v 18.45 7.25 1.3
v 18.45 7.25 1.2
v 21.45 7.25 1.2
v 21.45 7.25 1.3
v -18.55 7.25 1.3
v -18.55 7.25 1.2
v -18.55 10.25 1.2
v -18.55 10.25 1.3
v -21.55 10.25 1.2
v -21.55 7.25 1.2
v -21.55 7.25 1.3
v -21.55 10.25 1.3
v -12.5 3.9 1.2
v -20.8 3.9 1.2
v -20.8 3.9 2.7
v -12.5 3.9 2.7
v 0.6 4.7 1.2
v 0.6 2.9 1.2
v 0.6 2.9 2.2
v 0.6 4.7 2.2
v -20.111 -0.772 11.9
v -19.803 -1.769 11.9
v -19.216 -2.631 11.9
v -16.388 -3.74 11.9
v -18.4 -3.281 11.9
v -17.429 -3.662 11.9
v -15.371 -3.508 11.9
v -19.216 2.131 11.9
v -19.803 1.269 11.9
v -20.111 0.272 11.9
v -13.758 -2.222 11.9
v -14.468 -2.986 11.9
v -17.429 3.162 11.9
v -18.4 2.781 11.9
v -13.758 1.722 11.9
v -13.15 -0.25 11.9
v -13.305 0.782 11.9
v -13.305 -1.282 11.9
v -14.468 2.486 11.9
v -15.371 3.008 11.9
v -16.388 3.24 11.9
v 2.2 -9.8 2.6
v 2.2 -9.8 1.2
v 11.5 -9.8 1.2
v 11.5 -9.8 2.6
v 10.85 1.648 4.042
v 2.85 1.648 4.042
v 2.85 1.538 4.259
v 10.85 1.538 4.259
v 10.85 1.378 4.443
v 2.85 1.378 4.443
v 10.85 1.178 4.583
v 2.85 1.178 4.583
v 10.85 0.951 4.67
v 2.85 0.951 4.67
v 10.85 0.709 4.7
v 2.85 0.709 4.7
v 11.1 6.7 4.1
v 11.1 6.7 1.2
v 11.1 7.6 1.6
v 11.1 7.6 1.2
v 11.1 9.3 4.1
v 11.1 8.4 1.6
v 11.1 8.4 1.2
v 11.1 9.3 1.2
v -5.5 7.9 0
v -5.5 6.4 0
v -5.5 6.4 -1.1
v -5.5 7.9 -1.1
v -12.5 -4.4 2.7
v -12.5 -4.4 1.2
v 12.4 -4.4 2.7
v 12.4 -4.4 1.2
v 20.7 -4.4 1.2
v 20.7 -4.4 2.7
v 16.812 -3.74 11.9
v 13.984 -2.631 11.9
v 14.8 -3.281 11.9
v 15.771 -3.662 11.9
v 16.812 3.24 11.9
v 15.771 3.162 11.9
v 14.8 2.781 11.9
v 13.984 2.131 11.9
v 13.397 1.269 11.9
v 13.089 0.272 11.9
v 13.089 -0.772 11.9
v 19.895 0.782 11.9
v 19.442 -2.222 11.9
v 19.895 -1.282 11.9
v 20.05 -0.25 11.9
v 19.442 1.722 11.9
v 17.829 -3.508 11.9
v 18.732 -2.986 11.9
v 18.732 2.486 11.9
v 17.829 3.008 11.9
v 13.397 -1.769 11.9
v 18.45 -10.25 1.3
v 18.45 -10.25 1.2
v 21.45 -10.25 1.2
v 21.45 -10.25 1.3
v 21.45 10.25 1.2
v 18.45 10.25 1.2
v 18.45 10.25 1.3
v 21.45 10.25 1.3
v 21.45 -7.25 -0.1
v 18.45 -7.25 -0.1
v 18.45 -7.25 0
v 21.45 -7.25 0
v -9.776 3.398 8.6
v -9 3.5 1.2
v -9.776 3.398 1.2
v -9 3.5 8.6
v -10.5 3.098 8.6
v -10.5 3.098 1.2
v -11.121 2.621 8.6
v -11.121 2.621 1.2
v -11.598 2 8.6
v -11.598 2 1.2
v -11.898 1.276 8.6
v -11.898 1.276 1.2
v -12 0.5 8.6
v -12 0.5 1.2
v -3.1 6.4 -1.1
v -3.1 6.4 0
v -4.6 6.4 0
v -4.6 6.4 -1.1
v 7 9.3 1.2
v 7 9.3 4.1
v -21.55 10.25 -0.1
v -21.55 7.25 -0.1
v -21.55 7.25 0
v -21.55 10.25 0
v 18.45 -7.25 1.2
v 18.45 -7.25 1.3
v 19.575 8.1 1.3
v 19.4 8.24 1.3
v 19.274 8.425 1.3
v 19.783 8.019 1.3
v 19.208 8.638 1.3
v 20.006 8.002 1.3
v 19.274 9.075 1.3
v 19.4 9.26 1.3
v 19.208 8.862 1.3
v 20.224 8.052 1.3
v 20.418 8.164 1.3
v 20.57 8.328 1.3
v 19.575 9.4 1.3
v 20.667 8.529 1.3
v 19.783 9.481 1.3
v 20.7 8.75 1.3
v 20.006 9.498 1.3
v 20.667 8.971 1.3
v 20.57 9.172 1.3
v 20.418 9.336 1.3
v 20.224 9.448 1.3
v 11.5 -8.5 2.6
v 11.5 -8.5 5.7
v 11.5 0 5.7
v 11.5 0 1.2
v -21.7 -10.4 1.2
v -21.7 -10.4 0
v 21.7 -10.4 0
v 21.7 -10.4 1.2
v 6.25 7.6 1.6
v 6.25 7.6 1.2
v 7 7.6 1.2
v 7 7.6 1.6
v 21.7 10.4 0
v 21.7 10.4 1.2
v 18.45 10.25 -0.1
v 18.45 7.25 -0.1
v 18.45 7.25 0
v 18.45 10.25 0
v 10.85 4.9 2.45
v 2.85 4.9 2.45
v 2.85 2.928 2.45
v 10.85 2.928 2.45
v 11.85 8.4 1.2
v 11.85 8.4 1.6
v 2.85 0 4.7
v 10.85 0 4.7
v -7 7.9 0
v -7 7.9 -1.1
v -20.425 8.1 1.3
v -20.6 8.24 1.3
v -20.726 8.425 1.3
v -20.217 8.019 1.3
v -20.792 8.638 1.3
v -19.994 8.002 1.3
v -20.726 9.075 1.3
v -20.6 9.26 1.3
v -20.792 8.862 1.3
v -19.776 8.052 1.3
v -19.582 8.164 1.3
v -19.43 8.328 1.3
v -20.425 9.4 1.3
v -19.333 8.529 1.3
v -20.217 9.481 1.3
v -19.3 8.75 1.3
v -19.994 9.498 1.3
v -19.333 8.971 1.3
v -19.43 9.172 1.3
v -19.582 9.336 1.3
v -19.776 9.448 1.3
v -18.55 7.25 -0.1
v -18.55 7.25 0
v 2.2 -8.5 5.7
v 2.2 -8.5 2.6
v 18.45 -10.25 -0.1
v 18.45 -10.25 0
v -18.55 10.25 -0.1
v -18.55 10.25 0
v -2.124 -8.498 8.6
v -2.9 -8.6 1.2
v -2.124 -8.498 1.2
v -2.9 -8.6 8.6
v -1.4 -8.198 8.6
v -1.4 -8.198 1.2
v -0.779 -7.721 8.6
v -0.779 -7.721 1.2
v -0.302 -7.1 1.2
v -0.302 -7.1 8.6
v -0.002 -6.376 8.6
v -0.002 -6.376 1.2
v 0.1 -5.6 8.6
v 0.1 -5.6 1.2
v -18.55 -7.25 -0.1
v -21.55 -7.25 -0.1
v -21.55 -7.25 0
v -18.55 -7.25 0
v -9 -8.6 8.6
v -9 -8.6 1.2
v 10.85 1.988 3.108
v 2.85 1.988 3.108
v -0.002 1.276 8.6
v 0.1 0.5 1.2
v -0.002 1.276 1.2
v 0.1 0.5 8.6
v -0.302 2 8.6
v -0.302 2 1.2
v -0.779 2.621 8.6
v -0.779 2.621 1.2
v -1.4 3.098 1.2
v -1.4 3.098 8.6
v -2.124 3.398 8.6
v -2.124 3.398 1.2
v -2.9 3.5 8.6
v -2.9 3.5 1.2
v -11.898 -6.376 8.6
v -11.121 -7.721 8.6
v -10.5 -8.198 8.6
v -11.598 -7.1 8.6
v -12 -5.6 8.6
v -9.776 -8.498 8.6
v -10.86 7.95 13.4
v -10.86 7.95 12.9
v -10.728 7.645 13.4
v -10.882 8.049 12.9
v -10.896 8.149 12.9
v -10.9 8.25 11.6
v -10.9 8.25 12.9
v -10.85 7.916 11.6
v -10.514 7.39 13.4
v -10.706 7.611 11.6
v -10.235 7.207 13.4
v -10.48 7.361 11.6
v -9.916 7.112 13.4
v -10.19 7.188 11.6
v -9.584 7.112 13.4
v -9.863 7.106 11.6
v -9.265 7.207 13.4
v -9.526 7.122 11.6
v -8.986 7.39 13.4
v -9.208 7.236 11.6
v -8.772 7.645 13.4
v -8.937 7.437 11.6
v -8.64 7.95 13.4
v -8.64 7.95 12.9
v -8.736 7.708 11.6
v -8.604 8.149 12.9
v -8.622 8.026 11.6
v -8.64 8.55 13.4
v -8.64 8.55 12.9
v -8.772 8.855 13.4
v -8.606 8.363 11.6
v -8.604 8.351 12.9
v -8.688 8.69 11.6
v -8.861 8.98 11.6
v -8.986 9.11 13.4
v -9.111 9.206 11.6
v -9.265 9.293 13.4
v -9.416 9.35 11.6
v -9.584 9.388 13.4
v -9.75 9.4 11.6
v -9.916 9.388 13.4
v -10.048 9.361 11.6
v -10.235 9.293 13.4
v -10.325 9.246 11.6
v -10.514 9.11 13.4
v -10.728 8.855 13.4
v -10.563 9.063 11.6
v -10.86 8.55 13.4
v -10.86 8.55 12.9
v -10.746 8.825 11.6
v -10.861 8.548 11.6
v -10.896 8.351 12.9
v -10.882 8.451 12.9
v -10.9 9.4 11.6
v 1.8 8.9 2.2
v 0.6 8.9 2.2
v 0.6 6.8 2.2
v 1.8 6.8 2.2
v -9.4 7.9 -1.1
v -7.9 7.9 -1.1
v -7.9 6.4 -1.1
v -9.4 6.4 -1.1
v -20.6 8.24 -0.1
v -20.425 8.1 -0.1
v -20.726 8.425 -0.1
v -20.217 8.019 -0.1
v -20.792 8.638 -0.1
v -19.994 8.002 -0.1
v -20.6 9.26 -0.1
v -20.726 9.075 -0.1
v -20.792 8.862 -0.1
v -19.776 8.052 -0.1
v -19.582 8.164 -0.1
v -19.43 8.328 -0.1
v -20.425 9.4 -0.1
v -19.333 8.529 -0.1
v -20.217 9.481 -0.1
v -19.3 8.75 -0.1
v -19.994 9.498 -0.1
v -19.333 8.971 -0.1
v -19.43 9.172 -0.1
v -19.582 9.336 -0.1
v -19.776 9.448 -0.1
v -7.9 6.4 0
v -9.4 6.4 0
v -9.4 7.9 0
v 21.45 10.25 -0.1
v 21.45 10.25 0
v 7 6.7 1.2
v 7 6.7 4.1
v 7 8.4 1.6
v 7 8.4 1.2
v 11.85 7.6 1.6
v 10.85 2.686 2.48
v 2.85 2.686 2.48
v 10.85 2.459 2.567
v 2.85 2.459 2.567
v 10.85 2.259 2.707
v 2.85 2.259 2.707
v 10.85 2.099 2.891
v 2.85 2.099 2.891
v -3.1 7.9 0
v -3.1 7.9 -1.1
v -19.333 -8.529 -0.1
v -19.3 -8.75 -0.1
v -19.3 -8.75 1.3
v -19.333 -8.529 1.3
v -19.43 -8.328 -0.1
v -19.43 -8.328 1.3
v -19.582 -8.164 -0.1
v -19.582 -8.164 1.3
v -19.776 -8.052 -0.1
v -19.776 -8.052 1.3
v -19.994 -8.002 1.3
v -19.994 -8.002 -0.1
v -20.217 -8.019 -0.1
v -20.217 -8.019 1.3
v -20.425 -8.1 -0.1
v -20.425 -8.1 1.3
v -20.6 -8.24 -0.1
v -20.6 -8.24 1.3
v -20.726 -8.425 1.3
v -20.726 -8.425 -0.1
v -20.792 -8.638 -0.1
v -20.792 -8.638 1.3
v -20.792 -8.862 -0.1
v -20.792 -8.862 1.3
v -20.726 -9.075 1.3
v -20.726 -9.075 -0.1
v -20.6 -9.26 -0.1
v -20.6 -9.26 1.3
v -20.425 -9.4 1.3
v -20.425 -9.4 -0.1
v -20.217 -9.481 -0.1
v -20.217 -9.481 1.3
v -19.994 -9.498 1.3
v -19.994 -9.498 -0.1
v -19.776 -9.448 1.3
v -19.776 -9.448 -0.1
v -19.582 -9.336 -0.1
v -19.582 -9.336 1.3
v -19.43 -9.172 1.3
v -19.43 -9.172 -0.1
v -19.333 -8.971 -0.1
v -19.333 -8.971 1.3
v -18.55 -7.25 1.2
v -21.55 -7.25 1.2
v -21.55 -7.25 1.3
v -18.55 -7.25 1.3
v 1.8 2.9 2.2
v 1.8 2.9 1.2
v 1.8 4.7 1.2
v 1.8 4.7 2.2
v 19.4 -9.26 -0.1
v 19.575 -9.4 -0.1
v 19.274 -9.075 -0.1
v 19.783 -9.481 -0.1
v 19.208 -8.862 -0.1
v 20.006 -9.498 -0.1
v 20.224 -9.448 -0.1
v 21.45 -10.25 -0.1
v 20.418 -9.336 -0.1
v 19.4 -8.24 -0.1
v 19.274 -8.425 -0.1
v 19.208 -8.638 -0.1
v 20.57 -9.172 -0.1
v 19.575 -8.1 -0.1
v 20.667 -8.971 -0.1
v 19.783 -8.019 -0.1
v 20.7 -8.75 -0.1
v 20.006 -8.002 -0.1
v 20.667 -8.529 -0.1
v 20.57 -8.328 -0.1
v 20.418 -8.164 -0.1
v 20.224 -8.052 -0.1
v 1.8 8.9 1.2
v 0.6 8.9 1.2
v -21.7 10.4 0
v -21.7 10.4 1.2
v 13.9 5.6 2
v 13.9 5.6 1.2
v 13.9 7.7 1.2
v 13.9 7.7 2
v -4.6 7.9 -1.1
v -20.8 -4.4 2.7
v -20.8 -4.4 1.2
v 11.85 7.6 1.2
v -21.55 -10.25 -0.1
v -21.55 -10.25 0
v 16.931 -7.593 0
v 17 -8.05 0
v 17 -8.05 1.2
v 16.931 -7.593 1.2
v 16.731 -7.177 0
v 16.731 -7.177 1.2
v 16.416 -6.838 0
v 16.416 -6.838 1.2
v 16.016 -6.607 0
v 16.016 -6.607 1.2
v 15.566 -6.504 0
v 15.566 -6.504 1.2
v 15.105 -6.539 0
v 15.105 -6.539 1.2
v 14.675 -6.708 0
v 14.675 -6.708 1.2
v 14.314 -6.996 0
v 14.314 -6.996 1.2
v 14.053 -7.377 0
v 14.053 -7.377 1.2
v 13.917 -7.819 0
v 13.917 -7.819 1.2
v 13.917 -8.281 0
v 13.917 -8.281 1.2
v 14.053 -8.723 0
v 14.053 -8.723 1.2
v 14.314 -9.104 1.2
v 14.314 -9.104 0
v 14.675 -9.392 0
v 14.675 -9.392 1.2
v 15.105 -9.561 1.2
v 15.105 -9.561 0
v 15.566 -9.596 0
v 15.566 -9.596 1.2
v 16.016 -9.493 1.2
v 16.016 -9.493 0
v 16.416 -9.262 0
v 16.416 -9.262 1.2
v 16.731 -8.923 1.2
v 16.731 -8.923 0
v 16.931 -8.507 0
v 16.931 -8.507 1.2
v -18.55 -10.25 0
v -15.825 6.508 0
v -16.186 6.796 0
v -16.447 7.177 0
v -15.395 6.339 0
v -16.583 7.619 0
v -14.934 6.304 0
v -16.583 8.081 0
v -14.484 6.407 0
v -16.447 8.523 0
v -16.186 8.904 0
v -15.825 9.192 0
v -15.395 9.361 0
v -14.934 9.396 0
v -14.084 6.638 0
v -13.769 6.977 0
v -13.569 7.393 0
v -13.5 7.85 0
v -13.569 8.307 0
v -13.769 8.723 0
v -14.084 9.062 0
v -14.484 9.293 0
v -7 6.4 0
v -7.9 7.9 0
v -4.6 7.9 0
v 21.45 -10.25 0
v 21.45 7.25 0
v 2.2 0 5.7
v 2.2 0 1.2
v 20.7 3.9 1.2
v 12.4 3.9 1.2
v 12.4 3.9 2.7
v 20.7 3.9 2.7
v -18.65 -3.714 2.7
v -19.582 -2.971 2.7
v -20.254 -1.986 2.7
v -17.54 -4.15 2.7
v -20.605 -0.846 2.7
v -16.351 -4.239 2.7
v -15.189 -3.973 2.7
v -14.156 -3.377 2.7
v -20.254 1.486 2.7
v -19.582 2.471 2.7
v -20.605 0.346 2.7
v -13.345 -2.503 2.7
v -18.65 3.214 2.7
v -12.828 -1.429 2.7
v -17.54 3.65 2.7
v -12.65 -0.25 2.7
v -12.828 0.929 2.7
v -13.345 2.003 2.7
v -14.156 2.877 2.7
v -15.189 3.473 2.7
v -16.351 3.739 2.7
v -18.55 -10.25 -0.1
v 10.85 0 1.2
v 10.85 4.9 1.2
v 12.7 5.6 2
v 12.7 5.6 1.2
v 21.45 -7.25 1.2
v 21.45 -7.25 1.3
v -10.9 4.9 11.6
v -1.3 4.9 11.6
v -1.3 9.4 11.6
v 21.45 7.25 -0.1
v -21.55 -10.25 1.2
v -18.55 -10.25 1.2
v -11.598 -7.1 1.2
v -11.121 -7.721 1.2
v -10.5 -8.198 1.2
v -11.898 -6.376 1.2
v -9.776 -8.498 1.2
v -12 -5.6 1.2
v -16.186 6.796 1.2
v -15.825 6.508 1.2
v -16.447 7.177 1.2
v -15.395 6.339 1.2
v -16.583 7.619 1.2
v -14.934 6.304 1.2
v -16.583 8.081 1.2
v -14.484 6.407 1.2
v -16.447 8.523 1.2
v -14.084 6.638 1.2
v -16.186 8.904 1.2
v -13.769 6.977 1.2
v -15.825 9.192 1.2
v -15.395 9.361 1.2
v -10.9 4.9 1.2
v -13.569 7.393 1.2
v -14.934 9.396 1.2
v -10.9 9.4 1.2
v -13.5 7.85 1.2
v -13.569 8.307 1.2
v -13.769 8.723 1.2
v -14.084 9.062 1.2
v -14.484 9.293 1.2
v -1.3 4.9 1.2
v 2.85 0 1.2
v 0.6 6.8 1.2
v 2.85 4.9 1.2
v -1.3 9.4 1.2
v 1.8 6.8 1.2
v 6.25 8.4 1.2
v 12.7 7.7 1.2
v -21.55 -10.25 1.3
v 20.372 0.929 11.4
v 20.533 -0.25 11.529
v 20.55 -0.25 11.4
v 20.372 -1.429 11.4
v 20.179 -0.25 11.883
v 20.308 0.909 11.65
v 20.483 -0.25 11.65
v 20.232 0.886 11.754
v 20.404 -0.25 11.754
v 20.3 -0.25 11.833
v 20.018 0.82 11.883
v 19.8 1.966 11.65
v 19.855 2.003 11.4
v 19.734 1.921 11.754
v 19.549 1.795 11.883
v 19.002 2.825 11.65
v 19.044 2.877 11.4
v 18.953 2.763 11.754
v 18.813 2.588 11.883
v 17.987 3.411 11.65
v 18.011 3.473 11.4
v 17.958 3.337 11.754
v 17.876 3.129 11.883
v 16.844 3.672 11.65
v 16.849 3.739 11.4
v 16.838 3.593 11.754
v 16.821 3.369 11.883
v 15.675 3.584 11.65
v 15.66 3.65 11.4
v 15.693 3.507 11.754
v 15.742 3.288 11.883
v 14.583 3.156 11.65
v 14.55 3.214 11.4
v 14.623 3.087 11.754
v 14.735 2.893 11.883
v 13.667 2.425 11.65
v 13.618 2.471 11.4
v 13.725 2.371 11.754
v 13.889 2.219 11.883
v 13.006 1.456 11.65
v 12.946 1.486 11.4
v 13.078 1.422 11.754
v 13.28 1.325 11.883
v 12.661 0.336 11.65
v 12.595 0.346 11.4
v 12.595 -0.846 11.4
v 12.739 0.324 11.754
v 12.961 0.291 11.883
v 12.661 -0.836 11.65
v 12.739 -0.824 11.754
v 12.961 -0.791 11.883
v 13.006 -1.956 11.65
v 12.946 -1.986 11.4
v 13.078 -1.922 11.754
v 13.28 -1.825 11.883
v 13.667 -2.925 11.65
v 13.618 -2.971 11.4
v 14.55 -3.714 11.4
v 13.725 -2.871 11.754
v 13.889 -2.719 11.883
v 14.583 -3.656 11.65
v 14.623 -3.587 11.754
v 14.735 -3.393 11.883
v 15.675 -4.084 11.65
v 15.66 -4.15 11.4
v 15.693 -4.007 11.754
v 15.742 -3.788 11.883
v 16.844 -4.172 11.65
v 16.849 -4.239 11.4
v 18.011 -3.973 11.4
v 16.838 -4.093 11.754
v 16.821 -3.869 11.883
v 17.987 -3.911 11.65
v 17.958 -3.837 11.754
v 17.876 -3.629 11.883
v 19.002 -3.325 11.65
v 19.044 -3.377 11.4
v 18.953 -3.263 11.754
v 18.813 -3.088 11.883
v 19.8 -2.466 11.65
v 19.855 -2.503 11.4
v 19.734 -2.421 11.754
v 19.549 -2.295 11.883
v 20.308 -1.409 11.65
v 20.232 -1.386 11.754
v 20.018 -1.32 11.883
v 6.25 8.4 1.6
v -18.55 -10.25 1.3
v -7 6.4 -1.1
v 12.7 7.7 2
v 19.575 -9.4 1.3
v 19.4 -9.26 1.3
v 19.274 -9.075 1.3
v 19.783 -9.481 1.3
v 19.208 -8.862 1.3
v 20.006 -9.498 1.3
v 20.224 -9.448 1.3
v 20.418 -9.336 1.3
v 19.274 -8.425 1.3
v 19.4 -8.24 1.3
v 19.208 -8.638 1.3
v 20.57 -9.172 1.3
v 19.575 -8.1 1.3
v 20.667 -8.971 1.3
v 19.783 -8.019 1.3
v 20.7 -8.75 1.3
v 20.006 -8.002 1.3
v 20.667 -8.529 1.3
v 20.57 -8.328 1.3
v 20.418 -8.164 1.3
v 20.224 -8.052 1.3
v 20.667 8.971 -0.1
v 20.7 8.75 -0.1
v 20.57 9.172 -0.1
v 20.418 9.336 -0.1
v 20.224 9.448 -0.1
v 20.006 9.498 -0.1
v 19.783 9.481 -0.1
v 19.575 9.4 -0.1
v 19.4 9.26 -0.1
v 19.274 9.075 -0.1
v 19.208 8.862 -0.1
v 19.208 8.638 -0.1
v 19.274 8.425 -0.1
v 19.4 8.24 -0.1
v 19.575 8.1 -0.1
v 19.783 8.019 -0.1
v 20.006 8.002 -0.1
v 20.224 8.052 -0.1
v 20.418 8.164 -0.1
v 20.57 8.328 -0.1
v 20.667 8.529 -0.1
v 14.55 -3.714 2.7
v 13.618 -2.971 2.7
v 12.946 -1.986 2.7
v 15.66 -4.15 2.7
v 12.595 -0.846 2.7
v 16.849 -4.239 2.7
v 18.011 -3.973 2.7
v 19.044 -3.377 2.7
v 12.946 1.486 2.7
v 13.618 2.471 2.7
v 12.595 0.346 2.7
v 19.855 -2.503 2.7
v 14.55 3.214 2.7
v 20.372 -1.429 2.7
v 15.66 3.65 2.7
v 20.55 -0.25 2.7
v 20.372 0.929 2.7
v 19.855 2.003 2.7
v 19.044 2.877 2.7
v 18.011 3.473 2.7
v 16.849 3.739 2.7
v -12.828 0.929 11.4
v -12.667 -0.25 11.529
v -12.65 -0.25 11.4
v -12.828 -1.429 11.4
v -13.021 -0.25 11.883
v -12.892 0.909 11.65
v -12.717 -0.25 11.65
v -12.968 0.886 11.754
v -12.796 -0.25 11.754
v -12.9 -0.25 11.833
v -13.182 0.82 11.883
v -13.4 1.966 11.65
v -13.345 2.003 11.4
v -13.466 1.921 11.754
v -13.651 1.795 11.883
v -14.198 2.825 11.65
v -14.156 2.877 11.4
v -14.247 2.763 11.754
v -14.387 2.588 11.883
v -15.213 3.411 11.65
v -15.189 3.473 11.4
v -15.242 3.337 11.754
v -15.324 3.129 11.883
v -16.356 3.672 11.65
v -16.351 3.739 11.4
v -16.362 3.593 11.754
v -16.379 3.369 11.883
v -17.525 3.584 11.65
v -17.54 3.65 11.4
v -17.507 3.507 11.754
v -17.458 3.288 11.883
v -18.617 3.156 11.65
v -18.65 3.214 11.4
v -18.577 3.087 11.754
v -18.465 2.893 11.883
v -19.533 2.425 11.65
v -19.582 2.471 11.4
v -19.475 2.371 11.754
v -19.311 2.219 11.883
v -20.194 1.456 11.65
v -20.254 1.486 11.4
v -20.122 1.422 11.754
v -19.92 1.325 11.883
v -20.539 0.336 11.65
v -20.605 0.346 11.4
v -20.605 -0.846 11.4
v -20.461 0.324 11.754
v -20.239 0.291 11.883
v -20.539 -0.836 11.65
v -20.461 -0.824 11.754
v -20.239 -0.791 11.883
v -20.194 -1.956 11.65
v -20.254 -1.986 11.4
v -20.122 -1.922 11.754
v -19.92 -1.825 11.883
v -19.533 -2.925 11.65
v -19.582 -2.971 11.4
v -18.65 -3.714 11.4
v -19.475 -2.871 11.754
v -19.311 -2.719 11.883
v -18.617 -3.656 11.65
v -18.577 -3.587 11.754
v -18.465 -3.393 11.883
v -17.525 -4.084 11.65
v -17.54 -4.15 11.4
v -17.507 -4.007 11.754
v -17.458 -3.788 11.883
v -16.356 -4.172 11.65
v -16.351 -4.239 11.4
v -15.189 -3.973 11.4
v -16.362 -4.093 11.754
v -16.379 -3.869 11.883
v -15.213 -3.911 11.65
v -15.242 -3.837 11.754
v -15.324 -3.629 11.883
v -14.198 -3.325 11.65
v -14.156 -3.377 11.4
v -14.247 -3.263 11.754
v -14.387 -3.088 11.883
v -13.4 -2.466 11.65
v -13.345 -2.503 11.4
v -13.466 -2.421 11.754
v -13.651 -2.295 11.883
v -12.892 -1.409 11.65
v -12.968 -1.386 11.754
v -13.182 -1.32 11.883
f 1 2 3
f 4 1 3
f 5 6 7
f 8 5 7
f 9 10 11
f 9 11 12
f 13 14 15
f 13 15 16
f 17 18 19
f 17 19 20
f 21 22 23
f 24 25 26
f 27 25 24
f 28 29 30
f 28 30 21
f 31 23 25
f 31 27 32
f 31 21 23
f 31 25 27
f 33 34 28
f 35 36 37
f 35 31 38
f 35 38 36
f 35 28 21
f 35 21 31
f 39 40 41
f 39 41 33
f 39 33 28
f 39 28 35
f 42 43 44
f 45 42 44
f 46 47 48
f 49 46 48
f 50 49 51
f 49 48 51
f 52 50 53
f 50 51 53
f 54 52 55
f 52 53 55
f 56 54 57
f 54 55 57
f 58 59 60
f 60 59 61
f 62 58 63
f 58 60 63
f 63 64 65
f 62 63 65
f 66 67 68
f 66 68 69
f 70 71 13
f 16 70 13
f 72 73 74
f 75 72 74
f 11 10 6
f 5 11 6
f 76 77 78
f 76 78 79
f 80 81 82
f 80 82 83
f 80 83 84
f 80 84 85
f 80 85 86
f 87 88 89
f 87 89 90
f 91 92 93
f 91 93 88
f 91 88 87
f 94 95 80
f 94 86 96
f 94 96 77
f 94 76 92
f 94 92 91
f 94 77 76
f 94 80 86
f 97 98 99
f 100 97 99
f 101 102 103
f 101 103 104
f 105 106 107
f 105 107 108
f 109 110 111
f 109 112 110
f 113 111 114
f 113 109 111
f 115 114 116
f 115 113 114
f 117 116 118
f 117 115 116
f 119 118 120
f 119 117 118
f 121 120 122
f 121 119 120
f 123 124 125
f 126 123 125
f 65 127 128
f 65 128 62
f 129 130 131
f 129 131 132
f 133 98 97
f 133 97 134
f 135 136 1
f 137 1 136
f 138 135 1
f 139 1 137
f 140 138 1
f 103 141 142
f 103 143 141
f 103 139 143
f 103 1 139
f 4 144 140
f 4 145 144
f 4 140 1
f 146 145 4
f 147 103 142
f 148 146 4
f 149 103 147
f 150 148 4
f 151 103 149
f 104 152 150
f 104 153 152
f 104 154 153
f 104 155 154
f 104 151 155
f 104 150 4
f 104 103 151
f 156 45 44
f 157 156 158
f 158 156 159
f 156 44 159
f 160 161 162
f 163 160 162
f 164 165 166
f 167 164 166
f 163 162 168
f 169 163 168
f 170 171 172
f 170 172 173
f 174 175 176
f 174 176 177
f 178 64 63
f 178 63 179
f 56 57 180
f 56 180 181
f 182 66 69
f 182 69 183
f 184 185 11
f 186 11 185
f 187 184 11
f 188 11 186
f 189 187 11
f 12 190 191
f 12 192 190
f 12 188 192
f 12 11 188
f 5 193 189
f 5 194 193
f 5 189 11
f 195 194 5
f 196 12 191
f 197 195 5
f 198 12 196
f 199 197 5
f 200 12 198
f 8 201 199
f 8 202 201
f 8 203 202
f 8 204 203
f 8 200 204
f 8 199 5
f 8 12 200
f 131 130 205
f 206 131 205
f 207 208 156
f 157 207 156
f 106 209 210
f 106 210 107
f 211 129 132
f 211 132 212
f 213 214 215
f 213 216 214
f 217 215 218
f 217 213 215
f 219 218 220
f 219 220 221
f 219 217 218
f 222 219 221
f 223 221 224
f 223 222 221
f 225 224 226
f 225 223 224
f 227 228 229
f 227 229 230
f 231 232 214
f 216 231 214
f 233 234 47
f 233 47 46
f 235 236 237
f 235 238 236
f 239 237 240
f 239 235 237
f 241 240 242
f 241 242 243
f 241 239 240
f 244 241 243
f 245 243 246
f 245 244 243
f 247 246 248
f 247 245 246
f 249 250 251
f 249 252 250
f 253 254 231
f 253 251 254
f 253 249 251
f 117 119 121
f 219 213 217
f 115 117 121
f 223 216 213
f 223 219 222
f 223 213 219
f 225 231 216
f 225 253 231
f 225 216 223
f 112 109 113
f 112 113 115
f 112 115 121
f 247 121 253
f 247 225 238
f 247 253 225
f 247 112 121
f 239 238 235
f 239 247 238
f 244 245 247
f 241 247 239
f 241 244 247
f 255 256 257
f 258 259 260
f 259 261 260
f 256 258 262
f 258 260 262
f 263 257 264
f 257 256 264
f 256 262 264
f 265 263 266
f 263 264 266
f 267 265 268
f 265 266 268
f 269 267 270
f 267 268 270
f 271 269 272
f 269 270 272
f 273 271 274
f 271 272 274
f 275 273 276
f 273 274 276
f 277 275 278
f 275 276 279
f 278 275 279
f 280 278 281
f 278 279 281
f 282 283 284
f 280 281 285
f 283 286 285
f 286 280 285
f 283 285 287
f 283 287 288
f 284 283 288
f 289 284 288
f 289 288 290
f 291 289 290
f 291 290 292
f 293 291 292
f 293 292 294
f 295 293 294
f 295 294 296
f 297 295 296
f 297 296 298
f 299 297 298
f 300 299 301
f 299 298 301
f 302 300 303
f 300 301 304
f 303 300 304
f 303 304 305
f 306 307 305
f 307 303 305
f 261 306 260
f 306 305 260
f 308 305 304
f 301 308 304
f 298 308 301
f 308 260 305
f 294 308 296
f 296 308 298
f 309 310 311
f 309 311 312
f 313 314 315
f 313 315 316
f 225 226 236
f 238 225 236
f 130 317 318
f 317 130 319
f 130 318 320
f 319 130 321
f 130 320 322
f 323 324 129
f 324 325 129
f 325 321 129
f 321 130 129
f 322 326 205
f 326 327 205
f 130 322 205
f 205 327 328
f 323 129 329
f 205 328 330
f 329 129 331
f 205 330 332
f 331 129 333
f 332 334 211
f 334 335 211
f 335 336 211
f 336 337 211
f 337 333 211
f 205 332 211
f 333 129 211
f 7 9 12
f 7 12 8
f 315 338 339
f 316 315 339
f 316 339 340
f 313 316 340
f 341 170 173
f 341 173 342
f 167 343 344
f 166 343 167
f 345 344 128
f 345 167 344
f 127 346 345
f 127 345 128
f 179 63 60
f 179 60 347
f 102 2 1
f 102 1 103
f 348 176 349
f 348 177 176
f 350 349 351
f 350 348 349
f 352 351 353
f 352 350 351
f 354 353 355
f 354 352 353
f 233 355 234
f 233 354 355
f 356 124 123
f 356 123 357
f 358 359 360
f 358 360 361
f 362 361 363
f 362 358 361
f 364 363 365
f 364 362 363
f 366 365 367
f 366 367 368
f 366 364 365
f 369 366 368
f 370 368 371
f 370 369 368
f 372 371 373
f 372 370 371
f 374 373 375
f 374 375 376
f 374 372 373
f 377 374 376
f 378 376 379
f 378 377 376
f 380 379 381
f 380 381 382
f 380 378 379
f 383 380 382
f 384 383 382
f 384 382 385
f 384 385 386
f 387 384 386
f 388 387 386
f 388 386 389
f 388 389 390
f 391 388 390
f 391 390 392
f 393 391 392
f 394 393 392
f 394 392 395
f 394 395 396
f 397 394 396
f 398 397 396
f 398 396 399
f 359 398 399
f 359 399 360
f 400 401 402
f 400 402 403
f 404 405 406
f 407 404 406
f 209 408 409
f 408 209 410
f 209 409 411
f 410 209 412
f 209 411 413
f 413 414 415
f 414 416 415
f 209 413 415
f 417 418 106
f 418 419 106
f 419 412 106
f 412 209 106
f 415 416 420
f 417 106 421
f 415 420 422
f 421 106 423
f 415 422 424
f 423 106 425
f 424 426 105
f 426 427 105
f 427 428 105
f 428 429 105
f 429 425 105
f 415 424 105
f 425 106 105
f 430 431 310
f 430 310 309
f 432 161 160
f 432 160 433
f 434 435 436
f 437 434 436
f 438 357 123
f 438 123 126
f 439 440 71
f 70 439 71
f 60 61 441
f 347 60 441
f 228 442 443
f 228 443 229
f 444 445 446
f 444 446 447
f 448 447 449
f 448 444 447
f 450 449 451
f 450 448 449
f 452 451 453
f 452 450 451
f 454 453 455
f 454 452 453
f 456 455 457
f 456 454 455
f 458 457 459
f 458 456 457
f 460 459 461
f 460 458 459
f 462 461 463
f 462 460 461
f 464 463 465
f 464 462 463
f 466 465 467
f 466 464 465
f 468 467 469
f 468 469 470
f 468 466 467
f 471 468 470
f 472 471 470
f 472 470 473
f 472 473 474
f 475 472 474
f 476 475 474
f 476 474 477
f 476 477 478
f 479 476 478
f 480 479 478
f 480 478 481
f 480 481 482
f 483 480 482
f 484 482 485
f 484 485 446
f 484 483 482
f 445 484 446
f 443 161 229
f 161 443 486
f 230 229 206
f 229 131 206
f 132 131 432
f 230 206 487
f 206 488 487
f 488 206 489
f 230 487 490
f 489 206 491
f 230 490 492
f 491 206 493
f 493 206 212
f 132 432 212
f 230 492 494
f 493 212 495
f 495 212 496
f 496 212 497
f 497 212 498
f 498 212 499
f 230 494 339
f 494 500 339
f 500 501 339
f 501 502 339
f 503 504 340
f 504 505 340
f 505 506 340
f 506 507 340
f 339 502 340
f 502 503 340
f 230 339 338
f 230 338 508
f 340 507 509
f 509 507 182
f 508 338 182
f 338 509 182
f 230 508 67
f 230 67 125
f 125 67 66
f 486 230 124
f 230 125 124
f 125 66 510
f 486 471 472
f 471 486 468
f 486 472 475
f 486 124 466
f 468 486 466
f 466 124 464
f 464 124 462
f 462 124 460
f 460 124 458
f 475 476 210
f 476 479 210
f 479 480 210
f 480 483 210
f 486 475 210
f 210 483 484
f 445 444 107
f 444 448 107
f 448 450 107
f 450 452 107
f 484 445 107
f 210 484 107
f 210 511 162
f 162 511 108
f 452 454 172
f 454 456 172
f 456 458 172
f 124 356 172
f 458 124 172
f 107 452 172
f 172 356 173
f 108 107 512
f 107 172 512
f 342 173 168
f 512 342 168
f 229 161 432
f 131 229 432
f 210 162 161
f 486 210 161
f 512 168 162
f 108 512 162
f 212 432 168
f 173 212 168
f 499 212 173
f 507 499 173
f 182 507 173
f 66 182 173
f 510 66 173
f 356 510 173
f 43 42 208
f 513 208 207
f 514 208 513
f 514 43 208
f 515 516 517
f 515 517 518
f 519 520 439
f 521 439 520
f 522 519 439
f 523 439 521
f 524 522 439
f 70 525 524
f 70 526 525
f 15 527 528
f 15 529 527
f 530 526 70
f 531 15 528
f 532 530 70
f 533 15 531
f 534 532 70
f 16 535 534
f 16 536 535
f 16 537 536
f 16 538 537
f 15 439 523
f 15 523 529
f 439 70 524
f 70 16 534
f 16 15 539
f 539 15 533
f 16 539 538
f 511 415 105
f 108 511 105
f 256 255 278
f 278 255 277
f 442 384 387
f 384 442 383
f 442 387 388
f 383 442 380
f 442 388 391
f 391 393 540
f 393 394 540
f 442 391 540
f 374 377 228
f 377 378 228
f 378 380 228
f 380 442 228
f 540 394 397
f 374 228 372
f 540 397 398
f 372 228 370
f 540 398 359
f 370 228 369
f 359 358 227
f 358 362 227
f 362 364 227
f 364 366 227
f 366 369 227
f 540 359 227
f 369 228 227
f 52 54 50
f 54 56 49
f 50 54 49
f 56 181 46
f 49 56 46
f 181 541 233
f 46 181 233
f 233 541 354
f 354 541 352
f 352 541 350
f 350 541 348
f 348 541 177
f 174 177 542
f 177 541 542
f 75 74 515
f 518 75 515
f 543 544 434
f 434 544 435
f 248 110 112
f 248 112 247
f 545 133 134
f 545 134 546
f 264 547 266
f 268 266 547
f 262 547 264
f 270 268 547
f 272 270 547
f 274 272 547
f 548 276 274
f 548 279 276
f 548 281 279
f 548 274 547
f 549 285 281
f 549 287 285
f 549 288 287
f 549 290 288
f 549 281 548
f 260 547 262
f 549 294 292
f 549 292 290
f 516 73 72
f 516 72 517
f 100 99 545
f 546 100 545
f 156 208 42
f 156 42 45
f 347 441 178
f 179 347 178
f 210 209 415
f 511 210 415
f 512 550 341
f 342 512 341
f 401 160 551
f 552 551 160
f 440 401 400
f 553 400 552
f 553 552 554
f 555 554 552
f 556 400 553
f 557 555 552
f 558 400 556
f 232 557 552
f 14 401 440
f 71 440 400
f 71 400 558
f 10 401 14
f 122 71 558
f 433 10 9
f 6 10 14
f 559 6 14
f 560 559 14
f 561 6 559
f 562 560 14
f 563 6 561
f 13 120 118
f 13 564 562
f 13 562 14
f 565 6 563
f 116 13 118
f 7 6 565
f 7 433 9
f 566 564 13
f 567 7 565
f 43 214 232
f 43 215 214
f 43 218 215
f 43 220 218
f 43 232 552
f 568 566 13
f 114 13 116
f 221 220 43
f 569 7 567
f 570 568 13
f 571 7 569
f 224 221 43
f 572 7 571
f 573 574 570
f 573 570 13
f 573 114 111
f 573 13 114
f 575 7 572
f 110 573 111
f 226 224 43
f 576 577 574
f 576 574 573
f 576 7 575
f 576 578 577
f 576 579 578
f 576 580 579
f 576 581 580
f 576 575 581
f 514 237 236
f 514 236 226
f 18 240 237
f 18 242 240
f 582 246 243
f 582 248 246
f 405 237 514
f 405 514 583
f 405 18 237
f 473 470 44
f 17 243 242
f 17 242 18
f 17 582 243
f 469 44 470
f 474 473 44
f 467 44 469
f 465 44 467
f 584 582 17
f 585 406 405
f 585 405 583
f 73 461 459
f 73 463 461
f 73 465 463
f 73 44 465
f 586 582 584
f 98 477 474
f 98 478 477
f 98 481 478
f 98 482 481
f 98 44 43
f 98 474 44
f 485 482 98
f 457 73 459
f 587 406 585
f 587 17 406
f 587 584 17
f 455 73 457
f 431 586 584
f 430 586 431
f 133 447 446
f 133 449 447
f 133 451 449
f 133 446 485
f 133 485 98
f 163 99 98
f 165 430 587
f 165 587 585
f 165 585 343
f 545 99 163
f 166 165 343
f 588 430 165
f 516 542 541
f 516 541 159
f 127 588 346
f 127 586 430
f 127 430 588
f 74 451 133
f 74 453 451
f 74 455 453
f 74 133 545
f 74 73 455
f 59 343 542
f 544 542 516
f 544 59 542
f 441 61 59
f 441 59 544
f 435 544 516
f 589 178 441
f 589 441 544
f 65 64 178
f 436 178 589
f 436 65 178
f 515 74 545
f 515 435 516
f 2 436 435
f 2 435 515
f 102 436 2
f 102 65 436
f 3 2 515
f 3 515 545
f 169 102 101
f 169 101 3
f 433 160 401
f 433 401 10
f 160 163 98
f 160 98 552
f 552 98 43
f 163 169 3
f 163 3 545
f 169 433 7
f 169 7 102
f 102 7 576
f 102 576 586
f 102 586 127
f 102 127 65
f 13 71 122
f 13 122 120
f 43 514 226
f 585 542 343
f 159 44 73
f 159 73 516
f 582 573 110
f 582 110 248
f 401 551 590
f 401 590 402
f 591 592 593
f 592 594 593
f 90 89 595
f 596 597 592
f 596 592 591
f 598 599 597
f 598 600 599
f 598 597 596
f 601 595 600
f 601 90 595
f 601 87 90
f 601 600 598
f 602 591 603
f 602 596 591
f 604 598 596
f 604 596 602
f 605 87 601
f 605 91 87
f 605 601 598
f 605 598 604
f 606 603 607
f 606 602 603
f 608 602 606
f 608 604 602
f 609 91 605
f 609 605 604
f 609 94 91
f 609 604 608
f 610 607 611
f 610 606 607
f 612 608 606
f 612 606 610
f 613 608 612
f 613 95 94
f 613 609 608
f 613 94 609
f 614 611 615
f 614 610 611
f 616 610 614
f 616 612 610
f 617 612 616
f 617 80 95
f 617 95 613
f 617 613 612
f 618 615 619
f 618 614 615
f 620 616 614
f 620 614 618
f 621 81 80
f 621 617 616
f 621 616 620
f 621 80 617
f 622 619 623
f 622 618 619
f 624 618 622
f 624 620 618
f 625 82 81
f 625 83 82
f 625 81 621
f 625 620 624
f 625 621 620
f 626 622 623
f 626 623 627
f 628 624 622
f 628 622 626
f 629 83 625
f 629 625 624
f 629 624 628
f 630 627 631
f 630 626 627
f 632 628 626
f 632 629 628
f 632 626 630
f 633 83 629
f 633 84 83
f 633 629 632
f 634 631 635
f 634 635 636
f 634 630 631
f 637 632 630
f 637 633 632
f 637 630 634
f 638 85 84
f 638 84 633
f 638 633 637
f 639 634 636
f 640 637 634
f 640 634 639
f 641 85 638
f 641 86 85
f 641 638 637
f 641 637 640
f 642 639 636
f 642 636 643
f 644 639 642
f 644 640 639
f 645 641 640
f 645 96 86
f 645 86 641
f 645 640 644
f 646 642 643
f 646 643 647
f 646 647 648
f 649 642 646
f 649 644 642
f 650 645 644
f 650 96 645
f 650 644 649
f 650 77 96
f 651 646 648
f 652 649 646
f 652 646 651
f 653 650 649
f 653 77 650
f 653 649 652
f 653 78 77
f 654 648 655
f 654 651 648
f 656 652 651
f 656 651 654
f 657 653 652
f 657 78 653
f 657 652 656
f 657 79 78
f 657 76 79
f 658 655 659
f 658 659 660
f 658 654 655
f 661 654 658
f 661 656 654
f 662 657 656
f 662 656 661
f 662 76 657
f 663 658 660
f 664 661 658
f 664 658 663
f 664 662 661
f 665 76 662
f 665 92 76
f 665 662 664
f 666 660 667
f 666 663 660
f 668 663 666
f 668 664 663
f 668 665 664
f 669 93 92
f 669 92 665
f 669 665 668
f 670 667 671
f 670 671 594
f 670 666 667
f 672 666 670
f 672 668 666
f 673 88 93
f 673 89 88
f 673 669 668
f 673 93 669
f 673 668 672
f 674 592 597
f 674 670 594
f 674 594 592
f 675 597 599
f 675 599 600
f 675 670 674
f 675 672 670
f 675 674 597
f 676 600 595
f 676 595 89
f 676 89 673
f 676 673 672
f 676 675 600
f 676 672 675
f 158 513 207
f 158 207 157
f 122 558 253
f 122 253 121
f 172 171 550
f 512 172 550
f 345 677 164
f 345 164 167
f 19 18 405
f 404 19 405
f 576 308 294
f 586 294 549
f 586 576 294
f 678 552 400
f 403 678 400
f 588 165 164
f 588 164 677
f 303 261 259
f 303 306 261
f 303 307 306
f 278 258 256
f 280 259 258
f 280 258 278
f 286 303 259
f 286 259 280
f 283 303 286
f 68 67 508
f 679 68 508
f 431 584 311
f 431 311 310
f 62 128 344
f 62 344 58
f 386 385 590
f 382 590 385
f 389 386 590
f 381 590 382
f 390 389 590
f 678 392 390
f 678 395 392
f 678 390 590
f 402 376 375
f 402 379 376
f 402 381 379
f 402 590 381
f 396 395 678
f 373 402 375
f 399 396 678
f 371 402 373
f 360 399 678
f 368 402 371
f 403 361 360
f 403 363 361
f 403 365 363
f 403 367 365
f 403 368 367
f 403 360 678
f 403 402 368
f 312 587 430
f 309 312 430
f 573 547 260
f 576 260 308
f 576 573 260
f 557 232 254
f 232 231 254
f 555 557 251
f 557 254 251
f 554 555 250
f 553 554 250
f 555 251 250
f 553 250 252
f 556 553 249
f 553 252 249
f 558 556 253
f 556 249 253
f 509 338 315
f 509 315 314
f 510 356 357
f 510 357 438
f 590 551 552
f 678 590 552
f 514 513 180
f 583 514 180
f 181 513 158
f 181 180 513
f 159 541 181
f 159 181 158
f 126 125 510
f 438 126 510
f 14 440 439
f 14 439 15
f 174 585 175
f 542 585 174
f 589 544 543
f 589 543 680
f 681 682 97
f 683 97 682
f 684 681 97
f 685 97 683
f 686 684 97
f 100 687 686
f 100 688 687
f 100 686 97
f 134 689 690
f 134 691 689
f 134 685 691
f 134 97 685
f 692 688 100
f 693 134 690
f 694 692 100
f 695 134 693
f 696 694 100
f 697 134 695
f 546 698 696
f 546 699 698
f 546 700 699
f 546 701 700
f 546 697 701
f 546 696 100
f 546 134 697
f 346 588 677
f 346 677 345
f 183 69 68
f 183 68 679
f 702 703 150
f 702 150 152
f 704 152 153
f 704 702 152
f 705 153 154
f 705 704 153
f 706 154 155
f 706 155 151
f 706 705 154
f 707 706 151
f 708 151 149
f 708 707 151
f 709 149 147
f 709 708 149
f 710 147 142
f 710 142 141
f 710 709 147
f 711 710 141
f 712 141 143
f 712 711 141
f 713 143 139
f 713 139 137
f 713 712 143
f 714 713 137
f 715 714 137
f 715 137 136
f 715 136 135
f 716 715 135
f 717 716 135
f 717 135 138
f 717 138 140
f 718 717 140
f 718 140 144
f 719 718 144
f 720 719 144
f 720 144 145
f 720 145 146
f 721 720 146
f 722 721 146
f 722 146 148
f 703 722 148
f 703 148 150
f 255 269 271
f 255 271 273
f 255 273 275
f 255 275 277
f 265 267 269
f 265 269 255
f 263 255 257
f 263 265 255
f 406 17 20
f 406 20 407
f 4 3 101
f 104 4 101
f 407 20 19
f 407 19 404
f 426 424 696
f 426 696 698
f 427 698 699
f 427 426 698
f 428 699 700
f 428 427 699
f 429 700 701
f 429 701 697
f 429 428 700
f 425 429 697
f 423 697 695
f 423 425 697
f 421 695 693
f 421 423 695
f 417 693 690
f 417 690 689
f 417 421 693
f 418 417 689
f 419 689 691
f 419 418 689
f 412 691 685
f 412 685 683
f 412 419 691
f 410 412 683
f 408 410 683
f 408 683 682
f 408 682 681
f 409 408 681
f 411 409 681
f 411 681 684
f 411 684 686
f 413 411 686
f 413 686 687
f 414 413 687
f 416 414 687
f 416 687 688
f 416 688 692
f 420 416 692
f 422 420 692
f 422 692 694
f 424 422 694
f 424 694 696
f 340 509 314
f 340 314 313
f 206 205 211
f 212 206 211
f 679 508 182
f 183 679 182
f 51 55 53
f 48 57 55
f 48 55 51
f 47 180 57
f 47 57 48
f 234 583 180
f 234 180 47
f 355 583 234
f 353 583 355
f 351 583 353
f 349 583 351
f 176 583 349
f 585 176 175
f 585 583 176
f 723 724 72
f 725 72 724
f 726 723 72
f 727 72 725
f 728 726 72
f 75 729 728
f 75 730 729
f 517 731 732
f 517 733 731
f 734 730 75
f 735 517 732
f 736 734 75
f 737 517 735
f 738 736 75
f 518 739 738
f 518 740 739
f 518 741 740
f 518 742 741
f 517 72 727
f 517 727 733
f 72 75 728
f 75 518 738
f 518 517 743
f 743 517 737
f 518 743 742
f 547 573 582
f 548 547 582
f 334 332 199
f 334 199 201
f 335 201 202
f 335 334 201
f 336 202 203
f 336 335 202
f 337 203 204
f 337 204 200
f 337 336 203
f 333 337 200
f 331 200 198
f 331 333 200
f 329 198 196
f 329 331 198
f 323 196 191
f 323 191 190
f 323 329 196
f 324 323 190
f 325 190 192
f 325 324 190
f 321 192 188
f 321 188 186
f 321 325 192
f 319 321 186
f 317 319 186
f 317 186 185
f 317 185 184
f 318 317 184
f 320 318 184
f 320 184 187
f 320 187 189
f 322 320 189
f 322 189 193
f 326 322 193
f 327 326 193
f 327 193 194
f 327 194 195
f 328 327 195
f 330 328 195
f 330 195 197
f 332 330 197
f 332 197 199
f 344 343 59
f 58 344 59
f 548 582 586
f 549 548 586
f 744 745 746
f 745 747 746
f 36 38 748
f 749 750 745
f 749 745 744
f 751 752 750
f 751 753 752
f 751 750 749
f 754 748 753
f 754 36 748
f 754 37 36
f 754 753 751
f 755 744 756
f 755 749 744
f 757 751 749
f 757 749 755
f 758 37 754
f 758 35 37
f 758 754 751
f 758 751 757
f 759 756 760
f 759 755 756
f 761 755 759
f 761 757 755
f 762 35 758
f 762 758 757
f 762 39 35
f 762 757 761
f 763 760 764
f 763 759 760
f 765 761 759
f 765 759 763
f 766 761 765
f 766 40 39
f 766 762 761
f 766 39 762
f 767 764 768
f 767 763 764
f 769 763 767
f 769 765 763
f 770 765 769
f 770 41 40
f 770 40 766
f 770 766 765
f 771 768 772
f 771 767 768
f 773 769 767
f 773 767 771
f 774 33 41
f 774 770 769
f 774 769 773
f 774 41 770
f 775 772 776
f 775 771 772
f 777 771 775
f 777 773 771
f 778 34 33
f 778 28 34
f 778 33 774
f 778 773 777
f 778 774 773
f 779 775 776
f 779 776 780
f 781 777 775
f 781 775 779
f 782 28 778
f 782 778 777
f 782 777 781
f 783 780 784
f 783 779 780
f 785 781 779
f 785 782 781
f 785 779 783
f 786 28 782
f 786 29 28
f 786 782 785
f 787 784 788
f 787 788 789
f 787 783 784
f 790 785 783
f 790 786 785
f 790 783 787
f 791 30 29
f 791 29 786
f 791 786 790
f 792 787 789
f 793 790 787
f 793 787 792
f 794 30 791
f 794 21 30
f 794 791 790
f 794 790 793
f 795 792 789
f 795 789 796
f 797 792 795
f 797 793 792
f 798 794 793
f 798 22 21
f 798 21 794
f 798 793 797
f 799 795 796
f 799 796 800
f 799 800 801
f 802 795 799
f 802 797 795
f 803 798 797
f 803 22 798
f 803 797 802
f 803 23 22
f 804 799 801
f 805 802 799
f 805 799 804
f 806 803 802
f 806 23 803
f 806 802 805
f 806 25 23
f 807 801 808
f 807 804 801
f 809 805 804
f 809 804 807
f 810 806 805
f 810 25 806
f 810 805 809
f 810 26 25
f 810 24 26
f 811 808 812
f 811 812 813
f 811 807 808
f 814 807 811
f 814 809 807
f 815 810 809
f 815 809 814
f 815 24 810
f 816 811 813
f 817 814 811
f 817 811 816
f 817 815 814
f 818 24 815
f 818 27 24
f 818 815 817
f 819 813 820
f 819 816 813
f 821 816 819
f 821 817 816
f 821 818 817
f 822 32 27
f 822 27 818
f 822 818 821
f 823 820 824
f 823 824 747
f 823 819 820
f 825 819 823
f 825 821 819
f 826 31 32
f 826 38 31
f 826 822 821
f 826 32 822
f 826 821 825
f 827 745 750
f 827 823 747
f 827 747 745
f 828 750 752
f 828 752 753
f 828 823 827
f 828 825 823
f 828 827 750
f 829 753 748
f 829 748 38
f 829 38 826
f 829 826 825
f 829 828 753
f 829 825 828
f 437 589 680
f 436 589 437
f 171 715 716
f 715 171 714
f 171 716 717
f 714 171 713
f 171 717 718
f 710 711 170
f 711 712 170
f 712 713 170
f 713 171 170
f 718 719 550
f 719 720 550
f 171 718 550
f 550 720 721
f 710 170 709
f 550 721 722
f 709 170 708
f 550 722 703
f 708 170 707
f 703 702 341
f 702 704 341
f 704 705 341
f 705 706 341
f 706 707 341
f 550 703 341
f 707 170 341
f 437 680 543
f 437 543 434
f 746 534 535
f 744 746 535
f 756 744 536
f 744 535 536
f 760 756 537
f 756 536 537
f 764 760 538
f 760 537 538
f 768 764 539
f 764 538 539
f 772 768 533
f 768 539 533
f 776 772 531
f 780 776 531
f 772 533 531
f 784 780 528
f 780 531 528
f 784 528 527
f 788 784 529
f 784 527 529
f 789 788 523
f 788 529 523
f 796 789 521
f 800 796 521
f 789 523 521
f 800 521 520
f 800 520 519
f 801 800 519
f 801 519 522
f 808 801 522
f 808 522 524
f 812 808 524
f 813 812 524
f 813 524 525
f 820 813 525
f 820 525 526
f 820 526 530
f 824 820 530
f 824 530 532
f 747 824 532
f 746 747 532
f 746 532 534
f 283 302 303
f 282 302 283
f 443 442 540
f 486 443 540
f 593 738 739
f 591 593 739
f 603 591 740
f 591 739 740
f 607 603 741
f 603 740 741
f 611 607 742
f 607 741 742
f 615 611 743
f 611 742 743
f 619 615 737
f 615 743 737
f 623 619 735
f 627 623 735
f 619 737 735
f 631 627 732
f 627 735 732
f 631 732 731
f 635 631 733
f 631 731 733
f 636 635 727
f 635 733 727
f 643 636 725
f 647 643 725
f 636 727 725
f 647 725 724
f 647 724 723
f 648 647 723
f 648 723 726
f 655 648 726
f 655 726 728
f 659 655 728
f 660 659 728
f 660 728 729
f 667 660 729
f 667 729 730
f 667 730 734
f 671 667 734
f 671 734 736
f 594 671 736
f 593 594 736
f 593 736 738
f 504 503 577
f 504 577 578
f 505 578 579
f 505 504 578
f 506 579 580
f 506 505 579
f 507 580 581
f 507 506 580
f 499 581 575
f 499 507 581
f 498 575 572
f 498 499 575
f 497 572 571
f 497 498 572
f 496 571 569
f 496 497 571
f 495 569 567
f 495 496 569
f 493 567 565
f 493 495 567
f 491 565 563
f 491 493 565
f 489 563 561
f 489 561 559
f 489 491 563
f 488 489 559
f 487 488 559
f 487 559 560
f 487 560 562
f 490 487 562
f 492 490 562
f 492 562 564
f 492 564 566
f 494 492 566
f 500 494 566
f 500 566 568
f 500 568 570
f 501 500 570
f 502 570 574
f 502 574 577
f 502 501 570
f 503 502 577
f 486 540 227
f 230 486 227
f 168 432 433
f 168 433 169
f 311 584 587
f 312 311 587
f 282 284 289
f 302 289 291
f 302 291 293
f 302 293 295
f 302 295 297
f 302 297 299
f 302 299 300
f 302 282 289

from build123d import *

# Parameters (mm, degrees)
SKICA1_W                      = 43.4
SKICA1_H                      = 20.8
SKICA1_R                      = 1.55
P_IDAT_VYSUNUT_M1_DEPTH       = 1.2
SKICA3_W                      = 12.1
SKICA3_H                      = 12.1
P_IDAT_VYSUNUT_M2_DEPTH       = 7.4
ZAOBLIT1_R                    = 3
SKICA4_W                      = 9.6
SKICA4_H                      = 4.5
P_IDAT_VYSUNUT_M3_DEPTH       = 10.4
SKICA5_R                      = 1.15
P_IDAT_VYSUNUT_M4_DEPTH       = 1.8
SKICA6_W                      = 8.3
SKICA6_H                      = 8.3
SKICA6_R                      = 4
P_IDAT_VYSUNUT_M5_DEPTH       = 1.5
SKICA6_2_R                    = 4
P_IDAT_VYSUNUT_M6_DEPTH       = 10.7
ZAOBLIT2_R                    = 0.5
SKICA7_W                      = 9.3
SKICA7_H                      = 8.5
P_IDAT_VYSUNUT_M7_DEPTH       = 4.5
SKICA7_3_W                    = 9.3
SKICA7_3_H                    = 1.3
P_IDAT_VYSUNUT_M8_DEPTH       = 1.4
SKICA7_4_W                    = 8
SKICA7_4_H                    = 3.4
P_IDAT_VYSUNUT_M9_DEPTH       = 1.25
SKICA7_5_W                    = 8
SKICA7_5_H                    = 1.5
P_IDAT_VYSUNUT_M10_DEPTH      = 3.5
ZKOSEN_1_SIZE                 = 2
ZKOSEN_1_SIZE2                = 0.727940469
ZAOBLIT3_R                    = 1
ZAOBLIT4_R                    = 1
ZAOBLIT5_R                    = 1
SKICA8_W                      = 5.6
SKICA8_H                      = 0.8
P_IDAT_VYSUNUT_M11_DEPTH      = 0.4
SKICA8_3_W                    = 4.1
SKICA8_3_H                    = 2.6
P_IDAT_VYSUNUT_M12_DEPTH      = 2.9
SKICA9_W                      = 1.2
SKICA9_H                      = 1.8
SKICA9_H_2                    = 2.1
P_IDAT_VYSUNUT_M13_DEPTH      = 1
SKICA10_W                     = 1.2
SKICA10_H                     = 2.1
P_IDAT_VYSUNUT_M14_DEPTH      = 0.8
P_IDAT_VYSUNUT_M15_DEPTH      = 0.1
P_IDAT_VYSUNUT_M15_DEPTH_BACK = 1.3
SKICA11_W                     = 3
SKICA11_H                     = 3
SKICA11_R                     = 0.75
SKICA11_2_R                   = 0.75
ODEBRAT_VYSUNUT_M1_DEPTH      = 27.979436614
SKICA12_W                     = 3.658871704
SKICA12_H                     = 0.6
ODEBRAT_VYSUNUT_M2_DEPTH      = 0.5
SKICA13_W                     = 1.5
SKICA13_H                     = 1.5
P_IDAT_VYSUNUT_M16_DEPTH      = 1.1


with BuildPart() as part:
    # Skica1 → Přidat vysunutím1 (new body)
    with BuildSketch(Plane.XY):
        Rectangle(SKICA1_W, SKICA1_H)
        with Locations((-15.05, 7.85)):
            Circle(SKICA1_R, mode=Mode.SUBTRACT)
        with Locations((15.45, -8.05)):
            Circle(SKICA1_R, mode=Mode.SUBTRACT)
    extrude(amount=P_IDAT_VYSUNUT_M1_DEPTH)

    # Skica3 → Přidat vysunutím2 (add)
    with BuildSketch(Plane.XY.offset(1.2)):
        with Locations((-5.95, -2.55)):
            Rectangle(SKICA3_W, SKICA3_H)
    extrude(amount=P_IDAT_VYSUNUT_M2_DEPTH)

    # Zaoblit1
    zaoblit1_edges = [part.edges().sort_by_distance(p)[0] for p in [
        (0.1, -8.6, 4.9),
        (0.1, 3.5, 4.9),
        (-12, 3.5, 4.9),
        (-12, -8.6, 4.9),
    ]]
    fillet(zaoblit1_edges, radius=ZAOBLIT1_R)

    # Skica4 → Přidat vysunutím3 (add)
    with BuildSketch(Plane.XY.offset(1.2)):
        with Locations((-6.1, 7.15)):
            Rectangle(SKICA4_W, SKICA4_H)
    extrude(amount=P_IDAT_VYSUNUT_M3_DEPTH)

    # Skica5 → Přidat vysunutím4 (add)
    with BuildSketch(Plane.XY.offset(11.6)):
        with Locations(Location((-9.75, 8.25, 0), (0, 0, 180))):
            Circle(SKICA5_R)
    extrude(amount=P_IDAT_VYSUNUT_M4_DEPTH)

    # Skica6 → Přidat vysunutím5 (add)
    # profile 1 of 2: a face of its own
    with BuildSketch(Plane.XY.offset(1.2)):
        with Locations((-16.65, -0.25)):
            Rectangle(SKICA6_W, SKICA6_H)
        with Locations((-16.65, -0.25)):
            Circle(SKICA6_R, mode=Mode.SUBTRACT)
    # profile 2 of 2: a face of its own
    with BuildSketch(Plane.XY.offset(1.2)):
        with Locations((16.55, -0.25)):
            Rectangle(SKICA6_W, SKICA6_H)
        with Locations((16.55, -0.25)):
            Circle(SKICA6_R, mode=Mode.SUBTRACT)
    extrude(amount=P_IDAT_VYSUNUT_M5_DEPTH)

    # Skica6<2> → Přidat vysunutím6 (add)
    with BuildSketch(Plane.XY.offset(1.2)):
        with Locations((-16.65, -0.25)):
            Circle(SKICA6_2_R)
        with Locations((16.55, -0.25)):
            Circle(SKICA6_2_R)
    extrude(amount=P_IDAT_VYSUNUT_M6_DEPTH)

    # Zaoblit2
    zaoblit2_edges = [part.edges().sort_by_distance(p)[0] for p in [
        (-20.65, -0.25, 11.9),
        (12.55, -0.25, 11.9),
    ]]
    fillet(zaoblit2_edges, radius=ZAOBLIT2_R)

    # Skica7 → Přidat vysunutím7 (add)
    with BuildSketch(Plane.XY.offset(1.2)):
        with Locations((6.85, -4.25)):
            Rectangle(SKICA7_W, SKICA7_H)
    extrude(amount=P_IDAT_VYSUNUT_M7_DEPTH)

    # Skica7<3> → Přidat vysunutím8 (add)
    with BuildSketch(Plane.XY.offset(1.2)):
        with Locations((6.85, -9.15)):
            Rectangle(SKICA7_3_W, SKICA7_3_H)
    extrude(amount=P_IDAT_VYSUNUT_M8_DEPTH)

    # Skica7<4> → Přidat vysunutím9 (add)
    with BuildSketch(Plane.XY.offset(1.2)):
        with Locations((6.85, 3.2)):
            Rectangle(SKICA7_4_W, SKICA7_4_H)
    extrude(amount=P_IDAT_VYSUNUT_M9_DEPTH)

    # Skica7<5> → Přidat vysunutím10 (add)
    with BuildSketch(Plane.XY.offset(1.2)):
        with Locations((6.85, 0.75)):
            Rectangle(SKICA7_5_W, SKICA7_5_H)
    extrude(amount=P_IDAT_VYSUNUT_M10_DEPTH)

    # Zkosení1
    zkosen_1_edges = [part.edges().sort_by_distance(p)[0] for p in [
        (6.85, 1.5, 2.45),
    ]]
    zkosen_1_side = [part.faces().sort_by_distance(p)[0] for p in [
        (6.85, 1.5, 3.575),
    ]]
    chamfer(zkosen_1_edges, length=ZKOSEN_1_SIZE, length2=ZKOSEN_1_SIZE2, reference=zkosen_1_side[0])

    # Zaoblit3
    # the kernel refuses this fillet: 1 mm, written as the material it takes off along each edge
    with BuildSketch(Plane(origin=(12.503594569, 1.5, 4.7), x_dir=(0, 0, -1), z_dir=(-1, 0, 0))) as zaoblit3_piece_1:
        with BuildLine():
            CenterArc((1, 0.661437828), ZAOBLIT3_R, 180, 41.409622109)
            Line((0, 0.661437828), (-0.02, 0.661437828))
            Line((-0.02, 0.661437828), (-0.02, 0))
            Line((-0.02, 0), (0, -0.02))
            ThreePointArc((0, -0.02), (0.125, -0.02), (0.235, -0.013228757))
            Line((0.235, -0.013228757), (0.25, 0))
        make_face()
    extrude(amount=11.307189139, mode=Mode.SUBTRACT)

    # Zaoblit4
    # the kernel refuses this fillet: 1 mm, written as the material it takes off along each edge
    with BuildSketch(Plane(origin=(0.775606123, 1.5, 4.45), x_dir=(0, -0.953531662347256, 0.30129282915675026), z_dir=(1, 0, 0))) as zaoblit4_piece_1:
        with BuildLine():
            CenterArc((0.528464722, 0.953531662), ZAOBLIT4_R, 217.535269991, 70)
            Line((-0.264513729, 0.344281978), (-0.343811574, 0.28335701))
            Line((-0.343811574, 0.28335701), (-0.079297845, -0.060924968))
            Line((-0.079297845, -0.060924968), (-0.040473229, -0.091443522))
            ThreePointArc((-0.040473229, -0.091443522), (0.736154402, -0.134449607), (0.859886834, -0.095353166))
            Line((0.859886834, -0.095353166), (0.829757551, 0))
        make_face()
    extrude(amount=10.074393877, mode=Mode.SUBTRACT)

    # Zaoblit5
    zaoblit5_edges = [part.edges().sort_by_distance(p)[0] for p in [
        (6.85, 2.227940469, 2.45),
    ]]
    fillet(zaoblit5_edges, radius=ZAOBLIT5_R)

    # Skica8 → Přidat vysunutím11 (add)
    with BuildSketch(Plane.XY.offset(1.2)):
        with Locations((9.05, 8)):
            Rectangle(SKICA8_W, SKICA8_H)
    extrude(amount=P_IDAT_VYSUNUT_M11_DEPTH)

    # Skica8<3> → Přidat vysunutím12 (add)
    with BuildSketch(Plane.XY.offset(1.2)):
        with Locations((9.05, 8)):
            Rectangle(SKICA8_3_W, SKICA8_3_H)
    extrude(amount=P_IDAT_VYSUNUT_M12_DEPTH)

    # Skica9 → Přidat vysunutím13 (add)
    with BuildSketch(Plane.XY.offset(1.2)):
        with Locations((1.2, 3.8)):
            Rectangle(SKICA9_W, SKICA9_H)
        with Locations((1.2, 7.85)):
            Rectangle(SKICA9_W, SKICA9_H_2)
    extrude(amount=P_IDAT_VYSUNUT_M13_DEPTH)

    # Skica10 → Přidat vysunutím14 (add)
    with BuildSketch(Plane.XY.offset(1.2)):
        with Locations((13.3, 6.65)):
            Rectangle(SKICA10_W, SKICA10_H)
    extrude(amount=P_IDAT_VYSUNUT_M14_DEPTH)

    # Skica11 → Přidat vysunutím15 (add, two sides: drawn at the far end of the back side and taken through both)
    # profile 1 of 4: a face of its own
    with BuildSketch(Plane.XY.offset(1.2).offset(-P_IDAT_VYSUNUT_M15_DEPTH_BACK)):
        with Locations((19.95, -8.75)):
            Rectangle(SKICA11_W, SKICA11_H)
        with Locations((19.95, -8.75)):
            Circle(SKICA11_R, mode=Mode.SUBTRACT)
    # profile 2 of 4: a face of its own
    with BuildSketch(Plane.XY.offset(1.2).offset(-P_IDAT_VYSUNUT_M15_DEPTH_BACK)):
        with Locations((19.95, 8.75)):
            Rectangle(SKICA11_W, SKICA11_H)
        with Locations((19.95, 8.75)):
            Circle(SKICA11_R, mode=Mode.SUBTRACT)
    # profile 3 of 4: a face of its own
    with BuildSketch(Plane.XY.offset(1.2).offset(-P_IDAT_VYSUNUT_M15_DEPTH_BACK)):
        with Locations((-20.05, -8.75)):
            Rectangle(SKICA11_W, SKICA11_H)
        with Locations((-20.05, -8.75)):
            Circle(SKICA11_R, mode=Mode.SUBTRACT)
    # profile 4 of 4: a face of its own
    with BuildSketch(Plane.XY.offset(1.2).offset(-P_IDAT_VYSUNUT_M15_DEPTH_BACK)):
        with Locations((-20.05, 8.75)):
            Rectangle(SKICA11_W, SKICA11_H)
        with Locations((-20.05, 8.75)):
            Circle(SKICA11_R, mode=Mode.SUBTRACT)
    extrude(amount=P_IDAT_VYSUNUT_M15_DEPTH + P_IDAT_VYSUNUT_M15_DEPTH_BACK)

    # Skica11<2> → Odebrat vysunutím1 (cut, through all)
    with BuildSketch(Plane.XY.offset(1.2)):
        with Locations((-20.05, 8.75)):
            Circle(SKICA11_2_R)
        with Locations((-20.05, -8.75)):
            Circle(SKICA11_2_R)
        with Locations((19.95, 8.75)):
            Circle(SKICA11_2_R)
        with Locations((19.95, -8.75)):
            Circle(SKICA11_2_R)
    extrude(amount=-ODEBRAT_VYSUNUT_M1_DEPTH, mode=Mode.SUBTRACT)

    # Skica12 → Odebrat vysunutím2 (cut)
    with BuildSketch(Plane.XY.offset(13.4)):
        with Locations((-9.75, 8.25)):
            Rectangle(SKICA12_W, SKICA12_H)
    extrude(amount=-ODEBRAT_VYSUNUT_M2_DEPTH, mode=Mode.SUBTRACT)

    # Skica13 → Přidat vysunutím16 (add)
    with BuildSketch(Plane(origin=(0, 0, 0), x_dir=(-1, 0, 0), z_dir=(0, 0, -1))):
        with Locations((3.85, 7.15)):
            Rectangle(SKICA13_W, SKICA13_H)
        with Locations((6.25, 7.15)):
            Rectangle(SKICA13_W, SKICA13_H)
        with Locations((8.65, 7.15)):
            Rectangle(SKICA13_W, SKICA13_H)
    extrude(amount=P_IDAT_VYSUNUT_M16_DEPTH)


solid = part.part
